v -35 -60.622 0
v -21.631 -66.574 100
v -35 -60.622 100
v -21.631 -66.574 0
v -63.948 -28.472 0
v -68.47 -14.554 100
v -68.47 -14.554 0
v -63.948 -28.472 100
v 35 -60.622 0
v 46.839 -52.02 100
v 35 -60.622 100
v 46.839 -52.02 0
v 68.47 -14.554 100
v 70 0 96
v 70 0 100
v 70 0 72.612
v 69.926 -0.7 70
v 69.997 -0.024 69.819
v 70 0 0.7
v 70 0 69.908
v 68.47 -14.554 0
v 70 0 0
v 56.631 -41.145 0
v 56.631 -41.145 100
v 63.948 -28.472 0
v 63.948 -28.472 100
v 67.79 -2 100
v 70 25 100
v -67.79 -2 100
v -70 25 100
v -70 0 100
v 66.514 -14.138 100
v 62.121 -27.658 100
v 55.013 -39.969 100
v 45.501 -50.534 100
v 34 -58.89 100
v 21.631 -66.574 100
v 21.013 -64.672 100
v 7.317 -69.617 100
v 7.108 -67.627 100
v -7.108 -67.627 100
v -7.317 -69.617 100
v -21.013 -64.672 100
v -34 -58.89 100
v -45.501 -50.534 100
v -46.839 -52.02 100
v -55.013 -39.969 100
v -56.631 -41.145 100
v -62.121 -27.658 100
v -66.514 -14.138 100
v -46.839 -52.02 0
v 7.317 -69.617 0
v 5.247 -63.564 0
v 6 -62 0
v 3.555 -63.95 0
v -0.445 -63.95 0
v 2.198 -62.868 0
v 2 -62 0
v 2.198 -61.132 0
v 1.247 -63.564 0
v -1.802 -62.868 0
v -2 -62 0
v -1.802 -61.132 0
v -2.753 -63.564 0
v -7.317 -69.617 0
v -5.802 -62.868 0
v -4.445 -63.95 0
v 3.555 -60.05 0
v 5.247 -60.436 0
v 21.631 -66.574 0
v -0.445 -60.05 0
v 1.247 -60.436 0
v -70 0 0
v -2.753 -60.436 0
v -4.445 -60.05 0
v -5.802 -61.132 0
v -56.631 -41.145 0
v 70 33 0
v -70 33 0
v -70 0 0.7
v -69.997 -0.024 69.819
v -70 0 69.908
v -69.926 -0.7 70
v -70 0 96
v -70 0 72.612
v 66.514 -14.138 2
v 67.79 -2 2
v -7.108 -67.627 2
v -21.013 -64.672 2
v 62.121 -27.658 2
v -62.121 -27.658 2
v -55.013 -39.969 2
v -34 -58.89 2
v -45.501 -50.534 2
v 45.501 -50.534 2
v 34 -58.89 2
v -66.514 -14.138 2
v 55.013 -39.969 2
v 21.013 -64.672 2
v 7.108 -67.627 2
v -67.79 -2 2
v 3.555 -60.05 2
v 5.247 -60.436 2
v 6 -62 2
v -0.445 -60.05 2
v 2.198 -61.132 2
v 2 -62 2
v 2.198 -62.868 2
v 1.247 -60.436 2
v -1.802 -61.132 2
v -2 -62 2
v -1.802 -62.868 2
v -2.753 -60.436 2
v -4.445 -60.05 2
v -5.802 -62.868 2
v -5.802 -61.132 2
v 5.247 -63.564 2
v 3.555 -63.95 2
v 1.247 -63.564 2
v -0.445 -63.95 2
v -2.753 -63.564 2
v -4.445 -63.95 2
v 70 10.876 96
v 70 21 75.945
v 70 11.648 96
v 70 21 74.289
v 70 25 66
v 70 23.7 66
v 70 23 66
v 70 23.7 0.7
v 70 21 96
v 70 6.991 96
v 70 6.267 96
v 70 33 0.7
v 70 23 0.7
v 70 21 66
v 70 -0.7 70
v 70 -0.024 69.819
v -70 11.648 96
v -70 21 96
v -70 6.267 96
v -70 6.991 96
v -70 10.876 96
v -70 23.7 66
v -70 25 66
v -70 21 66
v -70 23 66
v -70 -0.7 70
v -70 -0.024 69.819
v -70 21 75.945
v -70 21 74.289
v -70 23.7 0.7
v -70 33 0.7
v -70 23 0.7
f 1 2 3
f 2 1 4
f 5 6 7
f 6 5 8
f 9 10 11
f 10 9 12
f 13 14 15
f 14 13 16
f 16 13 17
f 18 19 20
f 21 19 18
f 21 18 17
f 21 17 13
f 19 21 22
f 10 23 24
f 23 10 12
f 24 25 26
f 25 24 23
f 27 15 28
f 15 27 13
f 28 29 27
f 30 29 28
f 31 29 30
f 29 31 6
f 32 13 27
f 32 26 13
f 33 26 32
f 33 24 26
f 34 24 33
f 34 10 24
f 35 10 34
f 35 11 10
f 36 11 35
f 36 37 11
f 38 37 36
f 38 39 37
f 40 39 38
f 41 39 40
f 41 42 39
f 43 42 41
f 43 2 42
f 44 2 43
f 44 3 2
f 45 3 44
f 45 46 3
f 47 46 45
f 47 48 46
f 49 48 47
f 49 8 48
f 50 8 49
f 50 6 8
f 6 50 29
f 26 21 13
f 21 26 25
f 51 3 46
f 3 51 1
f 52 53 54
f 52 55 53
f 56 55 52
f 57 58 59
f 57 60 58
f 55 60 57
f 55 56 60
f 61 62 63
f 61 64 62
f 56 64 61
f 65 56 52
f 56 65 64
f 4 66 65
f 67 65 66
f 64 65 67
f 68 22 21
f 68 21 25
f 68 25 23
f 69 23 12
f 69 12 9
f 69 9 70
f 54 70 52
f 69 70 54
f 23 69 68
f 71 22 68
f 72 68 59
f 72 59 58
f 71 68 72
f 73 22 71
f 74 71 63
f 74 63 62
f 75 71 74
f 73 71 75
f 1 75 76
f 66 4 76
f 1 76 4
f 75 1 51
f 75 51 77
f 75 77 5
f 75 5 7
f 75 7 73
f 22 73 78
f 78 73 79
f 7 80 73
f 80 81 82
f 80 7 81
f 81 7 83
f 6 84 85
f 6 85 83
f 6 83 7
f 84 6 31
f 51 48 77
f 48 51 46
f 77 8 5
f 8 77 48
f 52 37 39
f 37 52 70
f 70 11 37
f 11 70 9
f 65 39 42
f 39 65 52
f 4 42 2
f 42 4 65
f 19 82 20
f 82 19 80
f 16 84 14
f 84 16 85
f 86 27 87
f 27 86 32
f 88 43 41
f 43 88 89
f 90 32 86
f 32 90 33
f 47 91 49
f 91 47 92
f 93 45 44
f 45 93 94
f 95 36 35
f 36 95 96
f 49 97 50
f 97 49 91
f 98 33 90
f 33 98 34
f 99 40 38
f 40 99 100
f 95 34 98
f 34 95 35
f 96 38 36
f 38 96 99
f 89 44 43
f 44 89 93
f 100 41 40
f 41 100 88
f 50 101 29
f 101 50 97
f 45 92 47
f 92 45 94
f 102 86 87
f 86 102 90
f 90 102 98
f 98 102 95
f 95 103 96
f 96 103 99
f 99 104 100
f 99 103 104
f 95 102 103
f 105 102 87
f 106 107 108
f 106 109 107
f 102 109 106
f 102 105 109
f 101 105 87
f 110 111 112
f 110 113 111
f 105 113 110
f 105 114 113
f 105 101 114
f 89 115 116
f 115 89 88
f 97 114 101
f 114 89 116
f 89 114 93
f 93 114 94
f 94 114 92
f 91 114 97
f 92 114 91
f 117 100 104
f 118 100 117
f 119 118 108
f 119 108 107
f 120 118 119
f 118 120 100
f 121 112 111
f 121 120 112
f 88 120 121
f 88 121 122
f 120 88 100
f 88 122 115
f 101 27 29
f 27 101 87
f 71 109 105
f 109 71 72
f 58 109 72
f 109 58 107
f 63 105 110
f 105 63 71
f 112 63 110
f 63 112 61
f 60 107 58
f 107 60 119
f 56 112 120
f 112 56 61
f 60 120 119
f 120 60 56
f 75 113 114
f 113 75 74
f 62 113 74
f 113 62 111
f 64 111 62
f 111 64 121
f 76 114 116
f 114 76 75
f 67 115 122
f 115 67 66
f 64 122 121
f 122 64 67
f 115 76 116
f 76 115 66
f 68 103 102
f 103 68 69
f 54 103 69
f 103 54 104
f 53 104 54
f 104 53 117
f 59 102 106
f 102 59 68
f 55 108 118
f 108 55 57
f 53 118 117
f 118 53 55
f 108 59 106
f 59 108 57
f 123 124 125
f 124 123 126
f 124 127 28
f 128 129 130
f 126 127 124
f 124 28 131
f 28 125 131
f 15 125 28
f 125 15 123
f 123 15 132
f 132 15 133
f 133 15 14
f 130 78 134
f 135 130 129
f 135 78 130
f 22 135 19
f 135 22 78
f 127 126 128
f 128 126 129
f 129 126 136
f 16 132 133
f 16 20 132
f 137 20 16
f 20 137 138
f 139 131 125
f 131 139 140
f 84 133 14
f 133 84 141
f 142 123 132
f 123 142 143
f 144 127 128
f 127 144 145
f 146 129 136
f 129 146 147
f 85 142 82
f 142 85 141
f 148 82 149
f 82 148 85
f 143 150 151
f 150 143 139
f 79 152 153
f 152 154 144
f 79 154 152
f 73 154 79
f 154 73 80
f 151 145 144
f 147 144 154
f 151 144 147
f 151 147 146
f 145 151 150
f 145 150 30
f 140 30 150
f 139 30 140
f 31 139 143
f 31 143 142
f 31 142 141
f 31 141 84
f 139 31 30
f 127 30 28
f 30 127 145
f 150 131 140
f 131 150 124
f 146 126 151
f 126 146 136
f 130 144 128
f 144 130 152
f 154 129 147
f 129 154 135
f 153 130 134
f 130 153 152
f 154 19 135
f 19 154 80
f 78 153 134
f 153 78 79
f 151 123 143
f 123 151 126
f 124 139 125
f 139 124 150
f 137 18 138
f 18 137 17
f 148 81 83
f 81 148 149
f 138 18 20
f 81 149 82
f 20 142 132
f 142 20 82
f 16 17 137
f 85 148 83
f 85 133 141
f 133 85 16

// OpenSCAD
h = 100;
w = 70;
s = 2;

hole_r = 2;

hs = 4;
hd = 21;
hw = w*2;
hl = 30;
support_with = 0.7;

difference() {
difference() {cylinder(h,w,w); translate([-w,0,-0.1])cube([w*2,w*2,h*2]);}
difference() { translate([0,0,s]) cylinder(h*2,w-s,w-s); translate([-w,-s,-0.1])cube([w*2,w*2,h*2]);}
translate([0,-(w-s-s-hole_r*2),-0.1])cylinder(s*2,hole_r,hole_r);
translate([-s*2,-(w-s-s-hole_r*2),-0.1])cylinder(s*2,hole_r,hole_r);
translate([s*2,-(w-s-s-hole_r*2),-0.1])cylinder(s*2,hole_r,hole_r);

}

translate([-w,0,h-hs-hl]) {
translate([0,hd,0]) cube([hw,hs,hl]);
translate([0,0,hl]) cube([hw,hd+hs,hs]);
}


translate([-w,hd+hs/2,0]) cube([w*2,support_with,h-hl-hs]);

translate([-w,0,0]) cube([w*2,hd+3*hs,support_with]);

translate([-w,hd+hs/2,h-hl]) rotate([25,0,0])cube([w*2,support_with,hl]);
translate([-w,-support_with,h-hl]) rotate([-15,0,0])cube([w*2,support_with,hl]);
